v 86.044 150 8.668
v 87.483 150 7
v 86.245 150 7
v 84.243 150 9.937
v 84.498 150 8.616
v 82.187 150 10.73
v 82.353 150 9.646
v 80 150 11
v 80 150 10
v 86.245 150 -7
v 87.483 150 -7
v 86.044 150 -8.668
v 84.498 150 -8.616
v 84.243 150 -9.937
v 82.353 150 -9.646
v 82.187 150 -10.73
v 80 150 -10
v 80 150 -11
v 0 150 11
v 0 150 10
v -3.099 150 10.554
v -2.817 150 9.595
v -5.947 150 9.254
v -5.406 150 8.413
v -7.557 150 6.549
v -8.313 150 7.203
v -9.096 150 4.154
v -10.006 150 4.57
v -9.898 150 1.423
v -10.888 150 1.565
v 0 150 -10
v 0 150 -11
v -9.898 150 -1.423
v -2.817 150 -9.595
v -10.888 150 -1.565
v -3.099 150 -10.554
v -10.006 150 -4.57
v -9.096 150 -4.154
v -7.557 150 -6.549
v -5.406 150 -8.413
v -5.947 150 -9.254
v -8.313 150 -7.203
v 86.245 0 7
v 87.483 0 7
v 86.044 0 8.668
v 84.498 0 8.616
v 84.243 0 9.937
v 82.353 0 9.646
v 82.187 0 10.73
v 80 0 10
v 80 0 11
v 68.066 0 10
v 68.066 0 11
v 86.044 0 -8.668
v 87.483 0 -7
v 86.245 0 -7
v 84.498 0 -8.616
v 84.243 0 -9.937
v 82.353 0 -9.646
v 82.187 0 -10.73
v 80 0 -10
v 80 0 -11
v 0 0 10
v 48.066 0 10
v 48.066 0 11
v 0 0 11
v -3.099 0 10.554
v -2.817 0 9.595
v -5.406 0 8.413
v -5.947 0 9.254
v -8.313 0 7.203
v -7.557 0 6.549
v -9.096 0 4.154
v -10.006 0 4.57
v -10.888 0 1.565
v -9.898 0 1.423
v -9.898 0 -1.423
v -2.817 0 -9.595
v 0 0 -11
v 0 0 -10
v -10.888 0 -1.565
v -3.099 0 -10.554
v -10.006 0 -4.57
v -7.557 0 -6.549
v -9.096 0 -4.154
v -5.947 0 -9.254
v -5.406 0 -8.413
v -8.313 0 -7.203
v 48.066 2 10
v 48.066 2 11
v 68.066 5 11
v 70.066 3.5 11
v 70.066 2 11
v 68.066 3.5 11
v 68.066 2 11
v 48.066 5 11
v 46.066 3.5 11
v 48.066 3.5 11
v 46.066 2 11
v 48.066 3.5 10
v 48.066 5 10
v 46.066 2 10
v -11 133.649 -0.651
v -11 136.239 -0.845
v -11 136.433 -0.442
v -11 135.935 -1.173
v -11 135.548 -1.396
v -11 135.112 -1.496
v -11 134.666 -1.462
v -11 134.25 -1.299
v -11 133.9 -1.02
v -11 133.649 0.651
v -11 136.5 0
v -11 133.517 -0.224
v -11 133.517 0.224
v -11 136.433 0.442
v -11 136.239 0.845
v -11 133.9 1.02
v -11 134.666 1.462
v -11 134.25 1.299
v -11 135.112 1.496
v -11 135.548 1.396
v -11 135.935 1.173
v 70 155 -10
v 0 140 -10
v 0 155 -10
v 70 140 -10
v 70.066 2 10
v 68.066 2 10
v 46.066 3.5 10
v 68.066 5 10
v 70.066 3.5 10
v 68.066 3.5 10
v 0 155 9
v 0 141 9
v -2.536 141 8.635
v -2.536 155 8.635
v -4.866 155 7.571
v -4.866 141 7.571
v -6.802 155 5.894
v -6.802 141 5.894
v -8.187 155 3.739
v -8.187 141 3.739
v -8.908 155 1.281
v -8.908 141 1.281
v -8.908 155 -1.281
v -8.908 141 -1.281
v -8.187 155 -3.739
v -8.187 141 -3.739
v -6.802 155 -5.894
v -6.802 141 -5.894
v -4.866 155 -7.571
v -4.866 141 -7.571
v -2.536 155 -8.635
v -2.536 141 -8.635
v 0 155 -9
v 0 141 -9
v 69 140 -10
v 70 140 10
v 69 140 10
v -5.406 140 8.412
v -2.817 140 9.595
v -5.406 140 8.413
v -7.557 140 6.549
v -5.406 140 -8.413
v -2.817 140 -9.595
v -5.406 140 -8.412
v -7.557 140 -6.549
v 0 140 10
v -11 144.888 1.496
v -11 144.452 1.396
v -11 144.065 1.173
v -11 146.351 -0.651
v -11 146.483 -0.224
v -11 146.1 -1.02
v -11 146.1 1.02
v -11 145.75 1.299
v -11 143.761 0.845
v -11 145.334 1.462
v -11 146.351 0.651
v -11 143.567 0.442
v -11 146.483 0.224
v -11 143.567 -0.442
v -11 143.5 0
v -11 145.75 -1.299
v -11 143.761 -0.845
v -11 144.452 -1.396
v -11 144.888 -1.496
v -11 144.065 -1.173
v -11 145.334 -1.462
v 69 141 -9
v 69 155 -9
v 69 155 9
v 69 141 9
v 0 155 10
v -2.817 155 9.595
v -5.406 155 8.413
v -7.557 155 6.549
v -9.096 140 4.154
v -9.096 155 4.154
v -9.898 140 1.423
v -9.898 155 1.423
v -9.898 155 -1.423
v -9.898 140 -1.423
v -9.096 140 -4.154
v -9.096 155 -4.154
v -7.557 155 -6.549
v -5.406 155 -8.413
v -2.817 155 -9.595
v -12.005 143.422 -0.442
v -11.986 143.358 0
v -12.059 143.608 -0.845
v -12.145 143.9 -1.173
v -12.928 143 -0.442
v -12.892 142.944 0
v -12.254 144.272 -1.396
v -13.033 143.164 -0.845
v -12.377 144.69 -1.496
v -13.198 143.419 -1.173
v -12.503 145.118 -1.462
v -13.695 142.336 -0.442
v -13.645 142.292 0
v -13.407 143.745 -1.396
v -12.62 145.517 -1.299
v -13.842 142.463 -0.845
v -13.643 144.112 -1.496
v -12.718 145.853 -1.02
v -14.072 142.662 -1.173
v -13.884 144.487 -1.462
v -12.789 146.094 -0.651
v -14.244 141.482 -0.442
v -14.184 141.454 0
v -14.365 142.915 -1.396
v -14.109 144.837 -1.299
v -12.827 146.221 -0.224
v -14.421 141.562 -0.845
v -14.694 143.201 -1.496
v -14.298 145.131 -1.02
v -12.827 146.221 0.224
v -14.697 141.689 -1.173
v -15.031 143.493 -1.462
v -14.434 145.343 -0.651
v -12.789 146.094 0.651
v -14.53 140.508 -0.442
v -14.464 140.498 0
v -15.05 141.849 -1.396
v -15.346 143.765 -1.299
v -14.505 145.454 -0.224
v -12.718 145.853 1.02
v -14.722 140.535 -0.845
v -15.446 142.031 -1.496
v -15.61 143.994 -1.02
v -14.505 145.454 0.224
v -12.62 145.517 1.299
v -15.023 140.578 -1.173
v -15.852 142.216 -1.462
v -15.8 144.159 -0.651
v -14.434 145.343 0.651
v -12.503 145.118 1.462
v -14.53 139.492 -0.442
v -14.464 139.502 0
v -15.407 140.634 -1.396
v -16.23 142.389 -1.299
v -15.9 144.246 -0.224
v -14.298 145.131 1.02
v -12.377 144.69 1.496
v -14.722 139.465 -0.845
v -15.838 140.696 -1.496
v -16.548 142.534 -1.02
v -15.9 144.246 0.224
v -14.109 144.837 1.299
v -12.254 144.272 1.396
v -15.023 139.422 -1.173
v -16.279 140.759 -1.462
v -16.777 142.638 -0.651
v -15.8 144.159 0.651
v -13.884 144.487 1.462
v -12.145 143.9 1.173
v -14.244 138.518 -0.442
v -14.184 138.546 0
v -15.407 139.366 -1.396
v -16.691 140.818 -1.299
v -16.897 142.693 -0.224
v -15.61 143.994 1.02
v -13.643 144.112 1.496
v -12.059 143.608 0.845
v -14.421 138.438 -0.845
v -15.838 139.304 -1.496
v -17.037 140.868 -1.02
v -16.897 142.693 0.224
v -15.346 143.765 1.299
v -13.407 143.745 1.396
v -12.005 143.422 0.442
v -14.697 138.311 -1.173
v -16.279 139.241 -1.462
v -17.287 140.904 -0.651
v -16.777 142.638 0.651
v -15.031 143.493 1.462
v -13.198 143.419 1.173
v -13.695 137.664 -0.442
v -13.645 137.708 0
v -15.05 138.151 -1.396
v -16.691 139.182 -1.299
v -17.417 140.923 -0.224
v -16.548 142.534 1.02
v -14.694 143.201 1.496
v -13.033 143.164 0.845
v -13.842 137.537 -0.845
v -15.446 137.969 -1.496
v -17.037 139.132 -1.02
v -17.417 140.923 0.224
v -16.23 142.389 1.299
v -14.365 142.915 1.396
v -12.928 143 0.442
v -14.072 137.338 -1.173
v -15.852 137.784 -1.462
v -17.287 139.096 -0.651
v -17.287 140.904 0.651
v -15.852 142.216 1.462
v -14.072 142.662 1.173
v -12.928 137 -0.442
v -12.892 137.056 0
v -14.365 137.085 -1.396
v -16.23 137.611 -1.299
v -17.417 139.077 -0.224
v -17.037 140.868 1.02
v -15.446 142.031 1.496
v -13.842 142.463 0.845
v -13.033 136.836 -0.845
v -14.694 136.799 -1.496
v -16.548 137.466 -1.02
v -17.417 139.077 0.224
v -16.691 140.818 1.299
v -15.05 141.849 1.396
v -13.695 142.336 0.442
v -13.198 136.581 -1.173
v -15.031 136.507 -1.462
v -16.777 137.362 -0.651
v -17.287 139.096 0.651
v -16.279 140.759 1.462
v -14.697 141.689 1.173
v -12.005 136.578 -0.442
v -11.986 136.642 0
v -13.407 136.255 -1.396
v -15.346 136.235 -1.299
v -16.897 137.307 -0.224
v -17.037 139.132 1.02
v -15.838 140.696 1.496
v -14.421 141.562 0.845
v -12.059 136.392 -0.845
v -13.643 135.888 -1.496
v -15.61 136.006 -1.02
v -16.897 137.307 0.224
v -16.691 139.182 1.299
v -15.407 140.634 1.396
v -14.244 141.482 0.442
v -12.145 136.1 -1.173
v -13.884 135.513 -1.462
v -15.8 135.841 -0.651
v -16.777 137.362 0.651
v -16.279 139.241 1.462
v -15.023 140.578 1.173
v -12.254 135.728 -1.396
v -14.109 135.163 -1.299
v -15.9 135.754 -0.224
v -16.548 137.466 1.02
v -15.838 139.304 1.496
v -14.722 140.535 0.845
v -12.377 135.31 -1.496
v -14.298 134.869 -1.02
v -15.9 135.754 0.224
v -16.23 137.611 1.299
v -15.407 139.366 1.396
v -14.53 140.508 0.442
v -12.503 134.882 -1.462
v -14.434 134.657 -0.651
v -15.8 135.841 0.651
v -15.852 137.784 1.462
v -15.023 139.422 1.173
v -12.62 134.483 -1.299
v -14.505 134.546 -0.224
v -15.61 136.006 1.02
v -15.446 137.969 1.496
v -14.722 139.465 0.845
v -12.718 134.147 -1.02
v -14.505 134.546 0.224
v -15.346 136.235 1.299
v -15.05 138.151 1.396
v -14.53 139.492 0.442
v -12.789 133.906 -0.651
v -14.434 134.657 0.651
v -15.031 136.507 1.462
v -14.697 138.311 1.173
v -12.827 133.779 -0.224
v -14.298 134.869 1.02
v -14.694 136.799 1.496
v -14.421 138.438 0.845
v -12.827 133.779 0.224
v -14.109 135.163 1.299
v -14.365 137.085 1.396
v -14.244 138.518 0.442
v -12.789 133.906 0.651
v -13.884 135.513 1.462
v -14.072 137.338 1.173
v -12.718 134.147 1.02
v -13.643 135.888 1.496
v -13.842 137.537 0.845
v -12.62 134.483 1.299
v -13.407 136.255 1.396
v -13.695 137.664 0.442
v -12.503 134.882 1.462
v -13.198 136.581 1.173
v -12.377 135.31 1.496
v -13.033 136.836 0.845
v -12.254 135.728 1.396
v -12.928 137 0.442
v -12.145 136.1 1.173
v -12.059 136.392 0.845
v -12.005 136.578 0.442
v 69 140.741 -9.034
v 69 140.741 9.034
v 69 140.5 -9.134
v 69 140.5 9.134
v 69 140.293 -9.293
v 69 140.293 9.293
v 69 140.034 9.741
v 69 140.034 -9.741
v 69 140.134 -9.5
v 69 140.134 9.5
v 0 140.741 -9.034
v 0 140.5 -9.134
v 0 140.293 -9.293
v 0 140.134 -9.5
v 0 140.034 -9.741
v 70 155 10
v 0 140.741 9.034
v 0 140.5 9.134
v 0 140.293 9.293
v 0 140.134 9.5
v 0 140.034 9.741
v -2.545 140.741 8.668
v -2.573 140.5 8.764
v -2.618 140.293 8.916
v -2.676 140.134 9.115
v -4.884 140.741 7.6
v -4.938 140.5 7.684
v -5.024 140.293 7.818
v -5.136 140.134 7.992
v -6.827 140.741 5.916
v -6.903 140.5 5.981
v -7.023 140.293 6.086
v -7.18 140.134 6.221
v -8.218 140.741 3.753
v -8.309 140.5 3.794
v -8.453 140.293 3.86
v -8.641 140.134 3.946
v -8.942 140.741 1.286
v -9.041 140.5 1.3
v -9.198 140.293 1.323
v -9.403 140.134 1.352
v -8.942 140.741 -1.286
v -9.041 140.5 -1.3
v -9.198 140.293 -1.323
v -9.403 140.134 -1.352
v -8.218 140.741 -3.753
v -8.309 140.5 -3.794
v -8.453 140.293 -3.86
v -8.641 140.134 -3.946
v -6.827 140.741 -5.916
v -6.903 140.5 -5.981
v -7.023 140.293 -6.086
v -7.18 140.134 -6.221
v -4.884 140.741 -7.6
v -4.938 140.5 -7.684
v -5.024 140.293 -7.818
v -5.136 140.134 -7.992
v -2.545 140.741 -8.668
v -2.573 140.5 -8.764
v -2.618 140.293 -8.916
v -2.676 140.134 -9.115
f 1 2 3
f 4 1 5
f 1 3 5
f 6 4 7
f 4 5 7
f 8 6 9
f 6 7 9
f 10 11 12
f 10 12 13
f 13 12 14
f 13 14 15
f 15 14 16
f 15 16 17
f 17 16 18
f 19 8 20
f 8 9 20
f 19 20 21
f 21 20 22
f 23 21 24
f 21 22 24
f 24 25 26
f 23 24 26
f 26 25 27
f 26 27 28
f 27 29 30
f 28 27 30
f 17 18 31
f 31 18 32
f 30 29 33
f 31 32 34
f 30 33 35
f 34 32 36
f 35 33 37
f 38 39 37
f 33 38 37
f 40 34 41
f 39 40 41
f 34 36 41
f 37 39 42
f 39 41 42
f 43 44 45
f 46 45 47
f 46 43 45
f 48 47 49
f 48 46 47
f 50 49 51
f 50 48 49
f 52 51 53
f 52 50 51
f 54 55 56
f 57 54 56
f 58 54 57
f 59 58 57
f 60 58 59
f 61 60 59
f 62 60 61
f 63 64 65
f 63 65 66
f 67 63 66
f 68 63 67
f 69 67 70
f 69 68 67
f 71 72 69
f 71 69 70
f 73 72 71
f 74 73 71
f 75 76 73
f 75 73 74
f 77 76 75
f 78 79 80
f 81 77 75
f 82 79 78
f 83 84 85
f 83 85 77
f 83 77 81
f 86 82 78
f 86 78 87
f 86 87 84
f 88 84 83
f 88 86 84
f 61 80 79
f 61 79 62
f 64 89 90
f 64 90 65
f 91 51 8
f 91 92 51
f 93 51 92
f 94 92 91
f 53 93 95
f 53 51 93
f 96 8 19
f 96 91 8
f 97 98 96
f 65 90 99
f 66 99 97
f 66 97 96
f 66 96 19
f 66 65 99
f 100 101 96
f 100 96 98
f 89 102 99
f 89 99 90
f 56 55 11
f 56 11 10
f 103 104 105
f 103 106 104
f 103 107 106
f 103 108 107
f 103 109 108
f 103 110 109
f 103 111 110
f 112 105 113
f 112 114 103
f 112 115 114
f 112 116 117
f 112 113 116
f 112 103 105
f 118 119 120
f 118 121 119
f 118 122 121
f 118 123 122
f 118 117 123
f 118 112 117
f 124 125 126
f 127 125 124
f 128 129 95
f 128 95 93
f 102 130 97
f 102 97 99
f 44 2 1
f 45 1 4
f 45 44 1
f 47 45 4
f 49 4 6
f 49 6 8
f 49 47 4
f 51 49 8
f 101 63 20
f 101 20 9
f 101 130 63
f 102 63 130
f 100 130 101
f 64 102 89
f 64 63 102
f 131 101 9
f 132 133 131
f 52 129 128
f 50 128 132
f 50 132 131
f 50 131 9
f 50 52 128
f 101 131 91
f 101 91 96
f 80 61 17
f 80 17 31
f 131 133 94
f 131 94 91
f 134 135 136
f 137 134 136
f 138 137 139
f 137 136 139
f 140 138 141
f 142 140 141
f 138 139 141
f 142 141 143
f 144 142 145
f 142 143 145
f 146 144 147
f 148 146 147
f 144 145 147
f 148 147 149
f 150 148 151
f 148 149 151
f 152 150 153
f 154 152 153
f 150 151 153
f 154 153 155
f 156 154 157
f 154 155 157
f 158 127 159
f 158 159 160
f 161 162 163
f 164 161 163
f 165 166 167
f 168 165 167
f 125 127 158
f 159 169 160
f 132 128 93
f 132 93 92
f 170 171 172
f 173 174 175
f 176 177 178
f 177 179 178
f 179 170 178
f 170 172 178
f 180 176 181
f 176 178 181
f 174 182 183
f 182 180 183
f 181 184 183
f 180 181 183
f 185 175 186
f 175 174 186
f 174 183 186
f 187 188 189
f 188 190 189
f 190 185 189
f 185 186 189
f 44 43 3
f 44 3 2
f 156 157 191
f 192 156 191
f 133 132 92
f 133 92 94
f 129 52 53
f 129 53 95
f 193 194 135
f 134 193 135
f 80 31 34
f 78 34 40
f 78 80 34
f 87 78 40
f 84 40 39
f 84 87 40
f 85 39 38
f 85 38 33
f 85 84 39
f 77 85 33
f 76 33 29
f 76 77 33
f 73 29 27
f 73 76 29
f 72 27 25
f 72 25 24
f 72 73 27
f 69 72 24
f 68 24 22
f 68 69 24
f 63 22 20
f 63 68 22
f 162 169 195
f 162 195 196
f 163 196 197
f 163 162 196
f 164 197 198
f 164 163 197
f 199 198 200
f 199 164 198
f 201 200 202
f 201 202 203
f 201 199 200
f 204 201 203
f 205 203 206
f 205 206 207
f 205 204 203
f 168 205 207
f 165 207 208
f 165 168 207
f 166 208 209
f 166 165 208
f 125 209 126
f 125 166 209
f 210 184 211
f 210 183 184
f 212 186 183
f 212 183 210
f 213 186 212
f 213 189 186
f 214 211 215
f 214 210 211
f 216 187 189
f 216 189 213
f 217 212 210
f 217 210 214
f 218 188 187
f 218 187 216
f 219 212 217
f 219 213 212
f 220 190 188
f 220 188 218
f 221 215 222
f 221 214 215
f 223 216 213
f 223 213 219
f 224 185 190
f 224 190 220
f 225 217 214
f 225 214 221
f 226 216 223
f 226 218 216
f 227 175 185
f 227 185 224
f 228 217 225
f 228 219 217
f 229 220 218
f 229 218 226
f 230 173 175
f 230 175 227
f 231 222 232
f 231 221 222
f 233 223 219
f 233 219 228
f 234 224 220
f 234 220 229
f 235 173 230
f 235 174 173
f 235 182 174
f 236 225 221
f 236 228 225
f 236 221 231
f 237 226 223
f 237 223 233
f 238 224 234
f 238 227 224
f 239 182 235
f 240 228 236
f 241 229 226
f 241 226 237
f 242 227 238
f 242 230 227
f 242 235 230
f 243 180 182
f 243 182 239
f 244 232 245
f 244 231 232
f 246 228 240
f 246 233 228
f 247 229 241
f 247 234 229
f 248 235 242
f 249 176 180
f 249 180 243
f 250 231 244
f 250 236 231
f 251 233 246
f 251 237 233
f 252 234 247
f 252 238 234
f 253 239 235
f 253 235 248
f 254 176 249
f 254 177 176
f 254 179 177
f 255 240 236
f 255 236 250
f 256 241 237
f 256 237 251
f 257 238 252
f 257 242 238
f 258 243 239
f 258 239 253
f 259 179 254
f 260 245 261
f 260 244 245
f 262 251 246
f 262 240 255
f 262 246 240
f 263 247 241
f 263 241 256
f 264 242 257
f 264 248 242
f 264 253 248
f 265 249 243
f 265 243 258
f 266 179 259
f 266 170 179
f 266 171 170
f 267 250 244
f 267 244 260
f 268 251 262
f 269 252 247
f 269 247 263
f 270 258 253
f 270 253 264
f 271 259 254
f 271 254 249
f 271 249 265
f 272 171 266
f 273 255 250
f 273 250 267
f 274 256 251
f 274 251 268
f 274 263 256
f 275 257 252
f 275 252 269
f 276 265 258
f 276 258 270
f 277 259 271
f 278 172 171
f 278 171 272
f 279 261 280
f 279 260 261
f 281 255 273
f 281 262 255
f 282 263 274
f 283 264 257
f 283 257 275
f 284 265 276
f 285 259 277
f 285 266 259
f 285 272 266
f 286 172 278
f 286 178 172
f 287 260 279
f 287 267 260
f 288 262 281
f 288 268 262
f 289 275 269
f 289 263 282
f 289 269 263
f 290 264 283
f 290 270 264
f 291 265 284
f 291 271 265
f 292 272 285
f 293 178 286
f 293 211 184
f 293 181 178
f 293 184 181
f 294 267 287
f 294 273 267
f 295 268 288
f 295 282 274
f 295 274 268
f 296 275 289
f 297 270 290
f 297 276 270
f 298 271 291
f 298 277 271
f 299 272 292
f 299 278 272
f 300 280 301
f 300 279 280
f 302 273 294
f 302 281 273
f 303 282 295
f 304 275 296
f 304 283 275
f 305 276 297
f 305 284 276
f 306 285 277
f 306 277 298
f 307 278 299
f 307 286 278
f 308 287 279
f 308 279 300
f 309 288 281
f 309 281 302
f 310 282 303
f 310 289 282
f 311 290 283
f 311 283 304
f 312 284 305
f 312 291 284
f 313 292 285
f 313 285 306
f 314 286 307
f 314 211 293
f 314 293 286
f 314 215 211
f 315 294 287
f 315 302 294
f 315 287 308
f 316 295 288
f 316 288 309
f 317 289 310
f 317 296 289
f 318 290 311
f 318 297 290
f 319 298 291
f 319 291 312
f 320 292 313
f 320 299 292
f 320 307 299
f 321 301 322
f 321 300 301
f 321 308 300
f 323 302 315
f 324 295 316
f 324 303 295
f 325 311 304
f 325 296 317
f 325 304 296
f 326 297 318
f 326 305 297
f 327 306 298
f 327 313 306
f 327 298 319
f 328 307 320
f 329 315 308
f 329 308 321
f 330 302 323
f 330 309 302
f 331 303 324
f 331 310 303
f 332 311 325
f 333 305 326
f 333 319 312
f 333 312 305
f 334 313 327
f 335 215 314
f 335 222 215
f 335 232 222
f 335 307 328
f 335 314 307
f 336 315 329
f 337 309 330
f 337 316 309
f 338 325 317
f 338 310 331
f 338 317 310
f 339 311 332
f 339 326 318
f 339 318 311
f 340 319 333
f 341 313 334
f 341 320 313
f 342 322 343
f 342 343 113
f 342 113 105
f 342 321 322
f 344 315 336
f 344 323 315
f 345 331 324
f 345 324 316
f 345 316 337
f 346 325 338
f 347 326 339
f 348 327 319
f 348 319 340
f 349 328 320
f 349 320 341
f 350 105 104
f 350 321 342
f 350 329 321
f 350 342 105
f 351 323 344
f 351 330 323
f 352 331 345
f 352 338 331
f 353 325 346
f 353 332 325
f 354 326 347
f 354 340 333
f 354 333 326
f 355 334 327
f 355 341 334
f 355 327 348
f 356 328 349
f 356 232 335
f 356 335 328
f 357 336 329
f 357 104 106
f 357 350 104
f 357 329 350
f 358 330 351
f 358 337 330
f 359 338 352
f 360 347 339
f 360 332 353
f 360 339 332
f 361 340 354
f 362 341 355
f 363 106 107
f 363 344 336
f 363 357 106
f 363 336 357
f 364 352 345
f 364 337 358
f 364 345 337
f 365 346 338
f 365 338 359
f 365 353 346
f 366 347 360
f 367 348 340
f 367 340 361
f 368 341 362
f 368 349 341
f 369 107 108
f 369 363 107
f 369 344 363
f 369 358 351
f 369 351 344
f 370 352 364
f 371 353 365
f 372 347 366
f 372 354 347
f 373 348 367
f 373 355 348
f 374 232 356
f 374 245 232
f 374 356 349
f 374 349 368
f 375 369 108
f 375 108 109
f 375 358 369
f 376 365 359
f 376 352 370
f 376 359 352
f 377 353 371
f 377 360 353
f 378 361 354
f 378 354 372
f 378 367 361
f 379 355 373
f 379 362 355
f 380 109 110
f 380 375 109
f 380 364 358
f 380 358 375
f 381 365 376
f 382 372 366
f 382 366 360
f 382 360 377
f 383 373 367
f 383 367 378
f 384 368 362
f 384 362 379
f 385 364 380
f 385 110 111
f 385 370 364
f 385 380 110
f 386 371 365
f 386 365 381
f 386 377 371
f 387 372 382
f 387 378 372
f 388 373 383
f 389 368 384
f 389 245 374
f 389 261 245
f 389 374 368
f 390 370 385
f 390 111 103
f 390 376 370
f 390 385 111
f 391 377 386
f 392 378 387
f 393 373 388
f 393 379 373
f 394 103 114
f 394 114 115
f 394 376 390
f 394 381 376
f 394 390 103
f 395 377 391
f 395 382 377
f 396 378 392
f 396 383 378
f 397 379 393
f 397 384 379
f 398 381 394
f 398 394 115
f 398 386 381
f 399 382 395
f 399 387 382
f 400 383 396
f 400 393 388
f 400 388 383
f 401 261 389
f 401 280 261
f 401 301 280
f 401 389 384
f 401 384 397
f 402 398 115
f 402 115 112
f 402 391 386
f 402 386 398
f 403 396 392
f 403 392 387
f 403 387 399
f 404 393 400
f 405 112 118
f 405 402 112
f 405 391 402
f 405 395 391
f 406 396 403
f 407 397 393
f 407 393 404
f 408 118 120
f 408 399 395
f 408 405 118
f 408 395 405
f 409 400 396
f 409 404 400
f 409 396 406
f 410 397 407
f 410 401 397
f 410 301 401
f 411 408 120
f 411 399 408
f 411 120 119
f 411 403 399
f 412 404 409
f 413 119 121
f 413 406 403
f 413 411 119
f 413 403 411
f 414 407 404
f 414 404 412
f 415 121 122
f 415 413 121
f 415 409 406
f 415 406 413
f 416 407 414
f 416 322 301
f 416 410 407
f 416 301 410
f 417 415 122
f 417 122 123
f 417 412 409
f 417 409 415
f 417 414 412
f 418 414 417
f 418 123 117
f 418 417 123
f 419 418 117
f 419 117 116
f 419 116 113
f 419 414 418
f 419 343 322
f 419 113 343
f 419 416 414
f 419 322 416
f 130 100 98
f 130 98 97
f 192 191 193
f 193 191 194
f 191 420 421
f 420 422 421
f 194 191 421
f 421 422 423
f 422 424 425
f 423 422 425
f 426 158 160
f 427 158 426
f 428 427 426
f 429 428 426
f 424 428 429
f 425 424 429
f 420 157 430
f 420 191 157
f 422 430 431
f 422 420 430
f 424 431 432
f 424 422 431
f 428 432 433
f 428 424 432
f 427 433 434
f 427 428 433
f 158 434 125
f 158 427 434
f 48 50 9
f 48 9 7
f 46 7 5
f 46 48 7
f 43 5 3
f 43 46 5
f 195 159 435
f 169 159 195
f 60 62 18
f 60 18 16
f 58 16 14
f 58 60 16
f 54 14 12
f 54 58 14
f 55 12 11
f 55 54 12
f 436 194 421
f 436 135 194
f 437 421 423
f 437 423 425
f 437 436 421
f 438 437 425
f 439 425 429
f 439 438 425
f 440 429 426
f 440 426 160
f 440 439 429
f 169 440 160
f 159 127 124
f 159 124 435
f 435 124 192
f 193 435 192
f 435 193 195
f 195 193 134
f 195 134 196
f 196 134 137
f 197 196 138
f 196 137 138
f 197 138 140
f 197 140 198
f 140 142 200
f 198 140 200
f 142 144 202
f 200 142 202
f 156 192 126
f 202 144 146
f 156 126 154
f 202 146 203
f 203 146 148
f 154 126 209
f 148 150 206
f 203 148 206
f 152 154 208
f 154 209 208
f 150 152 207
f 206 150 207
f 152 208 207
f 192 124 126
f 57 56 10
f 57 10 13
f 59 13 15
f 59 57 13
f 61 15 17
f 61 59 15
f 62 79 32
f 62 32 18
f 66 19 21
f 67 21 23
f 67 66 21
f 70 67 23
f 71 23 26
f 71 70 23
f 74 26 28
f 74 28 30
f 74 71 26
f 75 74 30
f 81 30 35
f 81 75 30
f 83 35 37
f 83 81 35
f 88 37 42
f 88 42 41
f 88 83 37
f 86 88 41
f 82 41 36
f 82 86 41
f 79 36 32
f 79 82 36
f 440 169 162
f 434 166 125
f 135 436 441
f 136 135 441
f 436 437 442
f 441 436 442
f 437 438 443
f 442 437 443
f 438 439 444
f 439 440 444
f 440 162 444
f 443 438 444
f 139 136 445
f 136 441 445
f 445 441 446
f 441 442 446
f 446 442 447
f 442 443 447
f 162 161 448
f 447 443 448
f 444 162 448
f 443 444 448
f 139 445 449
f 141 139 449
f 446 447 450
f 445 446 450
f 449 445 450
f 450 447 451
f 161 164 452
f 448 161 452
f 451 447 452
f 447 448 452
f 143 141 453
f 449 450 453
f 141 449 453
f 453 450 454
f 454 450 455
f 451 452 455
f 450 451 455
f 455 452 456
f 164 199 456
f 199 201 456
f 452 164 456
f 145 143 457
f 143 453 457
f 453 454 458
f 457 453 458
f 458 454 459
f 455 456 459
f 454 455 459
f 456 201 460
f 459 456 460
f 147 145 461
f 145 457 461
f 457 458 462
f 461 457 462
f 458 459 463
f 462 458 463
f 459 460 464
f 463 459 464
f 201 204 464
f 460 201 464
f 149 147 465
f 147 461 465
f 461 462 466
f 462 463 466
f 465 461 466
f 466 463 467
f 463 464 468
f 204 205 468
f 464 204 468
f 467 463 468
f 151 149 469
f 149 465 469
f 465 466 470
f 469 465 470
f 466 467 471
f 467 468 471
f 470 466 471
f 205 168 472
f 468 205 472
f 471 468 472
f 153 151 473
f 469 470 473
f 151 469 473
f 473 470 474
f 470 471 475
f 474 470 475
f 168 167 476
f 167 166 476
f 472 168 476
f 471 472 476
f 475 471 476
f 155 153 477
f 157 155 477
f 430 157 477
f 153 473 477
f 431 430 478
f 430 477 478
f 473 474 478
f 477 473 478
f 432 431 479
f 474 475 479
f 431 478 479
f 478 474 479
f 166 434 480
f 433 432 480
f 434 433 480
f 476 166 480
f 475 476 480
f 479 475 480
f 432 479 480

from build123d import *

# Parameters (mm, degrees)
BOSS_EXTRUDE1_DEPTH     = 150
BOSS_EXTRUDE2_DEPTH     = 15
FILLET9_R               = 1
CUT_EXTRUDE1_DEPTH      = 180.338591396
CUT_EXTRUDE1_DEPTH_BACK = 21
SWEEP1_PROFILE_R        = 1.5


with BuildPart() as part:
    # Sketch3 → Boss-Extrude1 (new body)
    with BuildSketch(Plane(origin=(0, 0, 0), x_dir=(1, 0, 0), z_dir=(0, 1, 0))):
        with BuildLine():
            Line((0, 11), (80, 11))
            ThreePointArc((80, 11), (84.242640687, 9.937253933), (87.483314774, 7))
            Line((87.483314774, 7), (86.244997998, 7))
            ThreePointArc((86.244997998, 7), (83.464101615, 9.211102551), (80, 10))
            Line((80, 10), (0, 10))
            ThreePointArc((0, 10), (-10, 0), (0, -10))
            Line((0, -10), (80, -10))
            ThreePointArc((80, -10), (83.464101615, -9.211102551), (86.244997998, -7))
            Line((86.244997998, -7), (87.483314774, -7))
            ThreePointArc((87.483314774, -7), (84.242640687, -9.937253933), (80, -11))
            Line((80, -11), (0, -11))
            ThreePointArc((0, -11), (-11, 0), (0, 11))
        make_face()
    extrude(amount=BOSS_EXTRUDE1_DEPTH)

    # Sketch7 → Cut-Extrude1 (cut, two sides: drawn at the far end of the back side and taken through both)
    with BuildSketch(Plane.XY.offset(11).offset(-CUT_EXTRUDE1_DEPTH_BACK)):
        Polygon((48.06573179, 0), (68.06573179, 0), (68.06573179, 2), (70.06573179, 2), (70.06573179, 3.5), (68.06573179, 3.5), (68.06573179, 5), (48.06573179, 5), (48.06573179, 3.5), (46.06573179, 3.5), (46.06573179, 2), (48.06573179, 2), align=None)
    extrude(amount=CUT_EXTRUDE1_DEPTH + CUT_EXTRUDE1_DEPTH_BACK, mode=Mode.SUBTRACT)


with BuildPart() as body_2:
    # Sketch4 → Boss-Extrude2 (new body)
    with BuildSketch(Plane(origin=(0, 140, 0), x_dir=(1, 0, 0), z_dir=(0, 1, 0))):
        with BuildLine():
            Line((0, 10), (70, 10))
            Line((70, 10), (70, -10))
            Line((70, -10), (0, -10))
            ThreePointArc((0, -10), (-10, 0), (0, 10))
        make_face()
        with BuildLine():
            Line((0, 9), (69, 9))
            Line((69, 9), (69, -9))
            Line((69, -9), (0, -9))
            ThreePointArc((0, -9), (-9, 0), (0, 9))
        make_face(mode=Mode.SUBTRACT)
    extrude(amount=BOSS_EXTRUDE2_DEPTH)

    # Fillet9
    fillet9_edges = [body_2.edges().sort_by_distance(p)[0] for p in [
        (34.5, 140, -9),
        (-9, 140, 0),
        (34.5, 140, 9),
    ]]
    fillet(fillet9_edges, radius=FILLET9_R - 0.0001)  # a hair under: the kernel refuses the full size


with BuildPart() as body_3:
    # Sweep1: sweep along a path in Sketch9
    with BuildLine(Plane.XY) as sweep1_path:
        ThreePointArc((-11, 145), (-16, 140), (-11, 135))
    # Sweep1 profile (on start of the path) → Sweep1 (sweep)
    with BuildSketch(Plane(origin=(-11, 145, 0), x_dir=(0, -1, 0), z_dir=(-1, 0, 0))):
        Circle(SWEEP1_PROFILE_R)
    sweep(path=sweep1_path.line)


solid = Compound([part.part, body_2.part, body_3.part])
